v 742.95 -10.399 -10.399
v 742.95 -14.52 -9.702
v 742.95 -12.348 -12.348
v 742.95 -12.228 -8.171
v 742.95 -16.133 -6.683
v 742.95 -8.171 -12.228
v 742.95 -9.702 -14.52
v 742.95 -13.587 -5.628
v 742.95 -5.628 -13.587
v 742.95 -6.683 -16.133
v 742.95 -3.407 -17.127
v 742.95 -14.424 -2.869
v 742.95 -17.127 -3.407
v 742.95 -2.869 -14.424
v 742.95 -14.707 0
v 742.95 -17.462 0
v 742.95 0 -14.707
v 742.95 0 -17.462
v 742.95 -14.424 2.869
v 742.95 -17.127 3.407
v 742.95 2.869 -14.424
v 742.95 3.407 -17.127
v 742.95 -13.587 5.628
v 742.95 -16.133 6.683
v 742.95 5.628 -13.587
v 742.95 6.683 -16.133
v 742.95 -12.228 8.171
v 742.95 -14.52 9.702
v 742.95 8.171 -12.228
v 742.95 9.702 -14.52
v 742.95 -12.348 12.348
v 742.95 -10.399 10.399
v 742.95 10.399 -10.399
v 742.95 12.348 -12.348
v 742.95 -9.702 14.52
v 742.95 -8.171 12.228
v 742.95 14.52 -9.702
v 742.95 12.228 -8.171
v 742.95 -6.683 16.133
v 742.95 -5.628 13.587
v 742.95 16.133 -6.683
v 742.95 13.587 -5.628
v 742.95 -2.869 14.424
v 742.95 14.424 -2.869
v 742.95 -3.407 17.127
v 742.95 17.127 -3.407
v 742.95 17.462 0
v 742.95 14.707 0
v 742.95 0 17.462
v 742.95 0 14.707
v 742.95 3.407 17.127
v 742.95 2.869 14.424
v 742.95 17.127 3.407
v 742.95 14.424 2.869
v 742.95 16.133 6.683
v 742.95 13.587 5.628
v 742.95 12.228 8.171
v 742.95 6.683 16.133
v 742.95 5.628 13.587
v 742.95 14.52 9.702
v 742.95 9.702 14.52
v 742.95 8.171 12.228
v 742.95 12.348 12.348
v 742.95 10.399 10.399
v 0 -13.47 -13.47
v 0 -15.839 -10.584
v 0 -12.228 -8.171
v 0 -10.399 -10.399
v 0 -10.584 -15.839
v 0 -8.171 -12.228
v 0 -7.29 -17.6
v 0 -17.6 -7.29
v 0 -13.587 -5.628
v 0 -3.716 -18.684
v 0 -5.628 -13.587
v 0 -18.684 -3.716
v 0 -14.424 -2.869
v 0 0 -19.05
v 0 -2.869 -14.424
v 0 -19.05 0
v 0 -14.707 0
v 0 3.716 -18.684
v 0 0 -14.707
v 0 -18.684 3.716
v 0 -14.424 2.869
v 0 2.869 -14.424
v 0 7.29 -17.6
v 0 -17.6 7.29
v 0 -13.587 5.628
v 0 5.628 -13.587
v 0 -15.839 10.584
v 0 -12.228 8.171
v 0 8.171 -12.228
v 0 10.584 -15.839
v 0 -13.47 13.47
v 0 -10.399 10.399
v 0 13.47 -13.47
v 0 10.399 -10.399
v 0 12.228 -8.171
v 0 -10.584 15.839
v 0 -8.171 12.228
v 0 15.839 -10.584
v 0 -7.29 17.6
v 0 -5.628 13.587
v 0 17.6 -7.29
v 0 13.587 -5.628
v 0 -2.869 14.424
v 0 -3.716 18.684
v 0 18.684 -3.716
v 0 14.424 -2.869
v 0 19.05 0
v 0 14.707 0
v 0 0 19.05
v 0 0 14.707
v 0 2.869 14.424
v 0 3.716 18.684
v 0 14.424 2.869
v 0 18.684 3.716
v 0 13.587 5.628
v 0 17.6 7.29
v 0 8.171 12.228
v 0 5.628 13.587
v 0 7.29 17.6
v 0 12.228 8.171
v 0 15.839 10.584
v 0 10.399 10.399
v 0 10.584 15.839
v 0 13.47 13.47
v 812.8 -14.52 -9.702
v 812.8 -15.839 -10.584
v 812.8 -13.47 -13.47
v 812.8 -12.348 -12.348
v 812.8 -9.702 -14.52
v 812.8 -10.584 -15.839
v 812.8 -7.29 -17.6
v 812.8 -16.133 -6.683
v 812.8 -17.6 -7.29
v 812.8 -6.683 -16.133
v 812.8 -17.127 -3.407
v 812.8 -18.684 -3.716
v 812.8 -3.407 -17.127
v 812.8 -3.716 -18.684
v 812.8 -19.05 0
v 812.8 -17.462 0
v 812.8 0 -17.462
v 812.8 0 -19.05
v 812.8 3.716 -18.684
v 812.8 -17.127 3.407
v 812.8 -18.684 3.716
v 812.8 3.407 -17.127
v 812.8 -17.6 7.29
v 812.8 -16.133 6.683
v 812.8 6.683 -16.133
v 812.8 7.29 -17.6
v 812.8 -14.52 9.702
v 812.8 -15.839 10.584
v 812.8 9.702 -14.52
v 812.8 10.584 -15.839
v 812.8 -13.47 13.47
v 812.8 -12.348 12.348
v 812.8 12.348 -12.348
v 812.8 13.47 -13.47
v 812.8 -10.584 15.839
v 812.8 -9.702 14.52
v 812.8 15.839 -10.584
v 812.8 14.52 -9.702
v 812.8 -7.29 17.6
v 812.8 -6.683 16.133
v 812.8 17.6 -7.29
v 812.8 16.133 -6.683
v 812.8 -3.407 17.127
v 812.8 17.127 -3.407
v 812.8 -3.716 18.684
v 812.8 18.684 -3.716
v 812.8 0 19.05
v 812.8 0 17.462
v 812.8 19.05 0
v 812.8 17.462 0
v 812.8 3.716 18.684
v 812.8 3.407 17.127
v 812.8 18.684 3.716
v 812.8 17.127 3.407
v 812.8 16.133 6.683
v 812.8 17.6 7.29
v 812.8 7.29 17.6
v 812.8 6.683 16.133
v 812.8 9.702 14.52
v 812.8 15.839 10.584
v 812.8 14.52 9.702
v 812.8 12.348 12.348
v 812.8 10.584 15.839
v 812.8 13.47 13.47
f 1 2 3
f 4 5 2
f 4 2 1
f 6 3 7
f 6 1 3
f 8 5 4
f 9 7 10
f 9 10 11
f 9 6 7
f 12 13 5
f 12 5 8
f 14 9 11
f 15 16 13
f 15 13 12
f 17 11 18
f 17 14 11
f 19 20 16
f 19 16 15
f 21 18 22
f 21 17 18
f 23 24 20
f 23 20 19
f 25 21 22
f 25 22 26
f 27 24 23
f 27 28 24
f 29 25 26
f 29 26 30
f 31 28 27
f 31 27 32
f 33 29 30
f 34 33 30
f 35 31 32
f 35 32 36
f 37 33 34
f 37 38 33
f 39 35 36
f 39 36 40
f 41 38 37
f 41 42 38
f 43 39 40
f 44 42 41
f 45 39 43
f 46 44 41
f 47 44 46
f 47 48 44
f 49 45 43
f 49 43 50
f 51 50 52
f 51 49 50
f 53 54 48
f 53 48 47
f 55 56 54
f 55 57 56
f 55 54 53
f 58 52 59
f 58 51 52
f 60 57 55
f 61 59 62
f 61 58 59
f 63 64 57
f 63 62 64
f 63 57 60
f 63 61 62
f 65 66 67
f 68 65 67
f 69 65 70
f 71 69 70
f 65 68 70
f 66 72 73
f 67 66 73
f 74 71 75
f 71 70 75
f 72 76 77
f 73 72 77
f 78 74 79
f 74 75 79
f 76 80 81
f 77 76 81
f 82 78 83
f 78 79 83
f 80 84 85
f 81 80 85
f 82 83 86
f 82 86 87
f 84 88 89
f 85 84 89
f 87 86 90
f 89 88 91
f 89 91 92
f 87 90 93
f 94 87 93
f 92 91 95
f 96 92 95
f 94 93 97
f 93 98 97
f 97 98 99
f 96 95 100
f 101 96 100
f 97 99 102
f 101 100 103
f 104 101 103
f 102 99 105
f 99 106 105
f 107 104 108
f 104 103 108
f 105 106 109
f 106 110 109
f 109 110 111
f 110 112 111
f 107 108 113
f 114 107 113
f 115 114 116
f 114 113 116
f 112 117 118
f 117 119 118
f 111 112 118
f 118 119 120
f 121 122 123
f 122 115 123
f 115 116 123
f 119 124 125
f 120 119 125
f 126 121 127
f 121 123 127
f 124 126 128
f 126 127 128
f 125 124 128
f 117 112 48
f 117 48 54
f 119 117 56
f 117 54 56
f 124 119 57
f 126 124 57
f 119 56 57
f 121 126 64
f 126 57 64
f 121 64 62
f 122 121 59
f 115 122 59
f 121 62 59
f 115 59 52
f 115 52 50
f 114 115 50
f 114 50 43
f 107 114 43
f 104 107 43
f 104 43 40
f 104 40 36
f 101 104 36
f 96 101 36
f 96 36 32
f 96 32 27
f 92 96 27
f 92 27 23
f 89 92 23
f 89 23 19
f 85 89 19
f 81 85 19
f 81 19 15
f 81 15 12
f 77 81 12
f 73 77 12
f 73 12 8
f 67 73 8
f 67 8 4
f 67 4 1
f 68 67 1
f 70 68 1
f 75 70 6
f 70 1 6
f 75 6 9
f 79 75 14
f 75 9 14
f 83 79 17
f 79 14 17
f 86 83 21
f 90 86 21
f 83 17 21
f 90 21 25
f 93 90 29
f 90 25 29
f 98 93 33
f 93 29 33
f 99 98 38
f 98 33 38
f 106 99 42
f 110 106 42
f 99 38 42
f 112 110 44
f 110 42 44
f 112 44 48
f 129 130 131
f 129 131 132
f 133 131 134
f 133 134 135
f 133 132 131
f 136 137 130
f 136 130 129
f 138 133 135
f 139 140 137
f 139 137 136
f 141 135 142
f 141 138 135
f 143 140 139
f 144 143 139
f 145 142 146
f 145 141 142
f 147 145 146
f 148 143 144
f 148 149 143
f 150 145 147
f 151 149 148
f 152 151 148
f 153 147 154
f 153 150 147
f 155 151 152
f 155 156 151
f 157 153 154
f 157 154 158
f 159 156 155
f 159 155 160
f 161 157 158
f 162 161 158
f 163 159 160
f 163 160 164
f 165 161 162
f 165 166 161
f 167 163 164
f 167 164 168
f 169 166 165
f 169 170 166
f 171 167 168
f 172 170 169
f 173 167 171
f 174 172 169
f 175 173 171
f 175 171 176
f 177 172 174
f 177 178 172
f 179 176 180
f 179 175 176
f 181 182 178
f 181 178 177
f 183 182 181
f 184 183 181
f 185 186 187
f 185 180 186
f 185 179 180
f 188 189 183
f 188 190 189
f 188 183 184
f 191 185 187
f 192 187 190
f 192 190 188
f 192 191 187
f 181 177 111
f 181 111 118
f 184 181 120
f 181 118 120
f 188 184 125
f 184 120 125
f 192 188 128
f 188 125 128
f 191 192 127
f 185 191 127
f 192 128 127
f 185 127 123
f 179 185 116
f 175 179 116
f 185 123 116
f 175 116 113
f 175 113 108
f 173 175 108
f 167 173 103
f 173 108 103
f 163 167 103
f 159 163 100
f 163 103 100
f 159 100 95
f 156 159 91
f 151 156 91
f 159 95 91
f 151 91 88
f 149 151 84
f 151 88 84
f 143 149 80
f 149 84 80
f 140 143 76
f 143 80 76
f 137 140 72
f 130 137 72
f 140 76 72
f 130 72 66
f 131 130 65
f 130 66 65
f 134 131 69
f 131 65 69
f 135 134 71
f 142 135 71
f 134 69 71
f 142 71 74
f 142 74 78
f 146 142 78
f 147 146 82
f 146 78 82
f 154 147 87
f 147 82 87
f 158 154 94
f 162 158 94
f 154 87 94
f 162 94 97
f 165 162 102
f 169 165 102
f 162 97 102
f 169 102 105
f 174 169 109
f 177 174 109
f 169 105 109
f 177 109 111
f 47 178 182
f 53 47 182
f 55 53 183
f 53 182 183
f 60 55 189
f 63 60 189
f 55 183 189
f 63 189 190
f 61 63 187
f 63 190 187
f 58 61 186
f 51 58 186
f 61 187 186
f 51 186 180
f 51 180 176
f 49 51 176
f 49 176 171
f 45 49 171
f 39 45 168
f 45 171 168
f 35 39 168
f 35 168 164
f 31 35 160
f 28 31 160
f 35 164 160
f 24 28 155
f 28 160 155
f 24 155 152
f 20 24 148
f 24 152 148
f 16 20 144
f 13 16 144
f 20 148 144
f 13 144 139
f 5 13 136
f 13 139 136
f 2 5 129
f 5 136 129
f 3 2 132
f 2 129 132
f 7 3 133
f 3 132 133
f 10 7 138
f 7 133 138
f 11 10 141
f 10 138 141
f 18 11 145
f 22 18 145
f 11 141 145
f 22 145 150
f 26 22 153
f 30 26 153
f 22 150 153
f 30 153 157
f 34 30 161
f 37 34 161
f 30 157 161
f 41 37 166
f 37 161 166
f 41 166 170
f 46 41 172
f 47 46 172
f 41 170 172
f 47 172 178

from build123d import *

# Parameters (mm, degrees)
F0_R     = 19.05
F1_DEPTH = 812.8
F2_R     = 17.4625
F3_DEPTH = 69.85
F4_R     = 14.7066
F5_DEPTH = 742.951


with BuildPart() as f1:
    # F0 (on Right) → F1 (new body)
    with BuildSketch(Plane.YZ):
        Circle(F0_R)
    extrude(amount=F1_DEPTH)

    # F2 (on face) → F3 (cut)
    with BuildSketch(Plane.YZ.offset(812.8)):
        Circle(F2_R)
    extrude(amount=-F3_DEPTH, mode=Mode.SUBTRACT)

    # F4 (on face) → F5 (cut, through all)
    with BuildSketch(Plane.YZ.offset(742.95)):
        Circle(F4_R)
    extrude(amount=-F5_DEPTH, mode=Mode.SUBTRACT)


solid = f1.part
